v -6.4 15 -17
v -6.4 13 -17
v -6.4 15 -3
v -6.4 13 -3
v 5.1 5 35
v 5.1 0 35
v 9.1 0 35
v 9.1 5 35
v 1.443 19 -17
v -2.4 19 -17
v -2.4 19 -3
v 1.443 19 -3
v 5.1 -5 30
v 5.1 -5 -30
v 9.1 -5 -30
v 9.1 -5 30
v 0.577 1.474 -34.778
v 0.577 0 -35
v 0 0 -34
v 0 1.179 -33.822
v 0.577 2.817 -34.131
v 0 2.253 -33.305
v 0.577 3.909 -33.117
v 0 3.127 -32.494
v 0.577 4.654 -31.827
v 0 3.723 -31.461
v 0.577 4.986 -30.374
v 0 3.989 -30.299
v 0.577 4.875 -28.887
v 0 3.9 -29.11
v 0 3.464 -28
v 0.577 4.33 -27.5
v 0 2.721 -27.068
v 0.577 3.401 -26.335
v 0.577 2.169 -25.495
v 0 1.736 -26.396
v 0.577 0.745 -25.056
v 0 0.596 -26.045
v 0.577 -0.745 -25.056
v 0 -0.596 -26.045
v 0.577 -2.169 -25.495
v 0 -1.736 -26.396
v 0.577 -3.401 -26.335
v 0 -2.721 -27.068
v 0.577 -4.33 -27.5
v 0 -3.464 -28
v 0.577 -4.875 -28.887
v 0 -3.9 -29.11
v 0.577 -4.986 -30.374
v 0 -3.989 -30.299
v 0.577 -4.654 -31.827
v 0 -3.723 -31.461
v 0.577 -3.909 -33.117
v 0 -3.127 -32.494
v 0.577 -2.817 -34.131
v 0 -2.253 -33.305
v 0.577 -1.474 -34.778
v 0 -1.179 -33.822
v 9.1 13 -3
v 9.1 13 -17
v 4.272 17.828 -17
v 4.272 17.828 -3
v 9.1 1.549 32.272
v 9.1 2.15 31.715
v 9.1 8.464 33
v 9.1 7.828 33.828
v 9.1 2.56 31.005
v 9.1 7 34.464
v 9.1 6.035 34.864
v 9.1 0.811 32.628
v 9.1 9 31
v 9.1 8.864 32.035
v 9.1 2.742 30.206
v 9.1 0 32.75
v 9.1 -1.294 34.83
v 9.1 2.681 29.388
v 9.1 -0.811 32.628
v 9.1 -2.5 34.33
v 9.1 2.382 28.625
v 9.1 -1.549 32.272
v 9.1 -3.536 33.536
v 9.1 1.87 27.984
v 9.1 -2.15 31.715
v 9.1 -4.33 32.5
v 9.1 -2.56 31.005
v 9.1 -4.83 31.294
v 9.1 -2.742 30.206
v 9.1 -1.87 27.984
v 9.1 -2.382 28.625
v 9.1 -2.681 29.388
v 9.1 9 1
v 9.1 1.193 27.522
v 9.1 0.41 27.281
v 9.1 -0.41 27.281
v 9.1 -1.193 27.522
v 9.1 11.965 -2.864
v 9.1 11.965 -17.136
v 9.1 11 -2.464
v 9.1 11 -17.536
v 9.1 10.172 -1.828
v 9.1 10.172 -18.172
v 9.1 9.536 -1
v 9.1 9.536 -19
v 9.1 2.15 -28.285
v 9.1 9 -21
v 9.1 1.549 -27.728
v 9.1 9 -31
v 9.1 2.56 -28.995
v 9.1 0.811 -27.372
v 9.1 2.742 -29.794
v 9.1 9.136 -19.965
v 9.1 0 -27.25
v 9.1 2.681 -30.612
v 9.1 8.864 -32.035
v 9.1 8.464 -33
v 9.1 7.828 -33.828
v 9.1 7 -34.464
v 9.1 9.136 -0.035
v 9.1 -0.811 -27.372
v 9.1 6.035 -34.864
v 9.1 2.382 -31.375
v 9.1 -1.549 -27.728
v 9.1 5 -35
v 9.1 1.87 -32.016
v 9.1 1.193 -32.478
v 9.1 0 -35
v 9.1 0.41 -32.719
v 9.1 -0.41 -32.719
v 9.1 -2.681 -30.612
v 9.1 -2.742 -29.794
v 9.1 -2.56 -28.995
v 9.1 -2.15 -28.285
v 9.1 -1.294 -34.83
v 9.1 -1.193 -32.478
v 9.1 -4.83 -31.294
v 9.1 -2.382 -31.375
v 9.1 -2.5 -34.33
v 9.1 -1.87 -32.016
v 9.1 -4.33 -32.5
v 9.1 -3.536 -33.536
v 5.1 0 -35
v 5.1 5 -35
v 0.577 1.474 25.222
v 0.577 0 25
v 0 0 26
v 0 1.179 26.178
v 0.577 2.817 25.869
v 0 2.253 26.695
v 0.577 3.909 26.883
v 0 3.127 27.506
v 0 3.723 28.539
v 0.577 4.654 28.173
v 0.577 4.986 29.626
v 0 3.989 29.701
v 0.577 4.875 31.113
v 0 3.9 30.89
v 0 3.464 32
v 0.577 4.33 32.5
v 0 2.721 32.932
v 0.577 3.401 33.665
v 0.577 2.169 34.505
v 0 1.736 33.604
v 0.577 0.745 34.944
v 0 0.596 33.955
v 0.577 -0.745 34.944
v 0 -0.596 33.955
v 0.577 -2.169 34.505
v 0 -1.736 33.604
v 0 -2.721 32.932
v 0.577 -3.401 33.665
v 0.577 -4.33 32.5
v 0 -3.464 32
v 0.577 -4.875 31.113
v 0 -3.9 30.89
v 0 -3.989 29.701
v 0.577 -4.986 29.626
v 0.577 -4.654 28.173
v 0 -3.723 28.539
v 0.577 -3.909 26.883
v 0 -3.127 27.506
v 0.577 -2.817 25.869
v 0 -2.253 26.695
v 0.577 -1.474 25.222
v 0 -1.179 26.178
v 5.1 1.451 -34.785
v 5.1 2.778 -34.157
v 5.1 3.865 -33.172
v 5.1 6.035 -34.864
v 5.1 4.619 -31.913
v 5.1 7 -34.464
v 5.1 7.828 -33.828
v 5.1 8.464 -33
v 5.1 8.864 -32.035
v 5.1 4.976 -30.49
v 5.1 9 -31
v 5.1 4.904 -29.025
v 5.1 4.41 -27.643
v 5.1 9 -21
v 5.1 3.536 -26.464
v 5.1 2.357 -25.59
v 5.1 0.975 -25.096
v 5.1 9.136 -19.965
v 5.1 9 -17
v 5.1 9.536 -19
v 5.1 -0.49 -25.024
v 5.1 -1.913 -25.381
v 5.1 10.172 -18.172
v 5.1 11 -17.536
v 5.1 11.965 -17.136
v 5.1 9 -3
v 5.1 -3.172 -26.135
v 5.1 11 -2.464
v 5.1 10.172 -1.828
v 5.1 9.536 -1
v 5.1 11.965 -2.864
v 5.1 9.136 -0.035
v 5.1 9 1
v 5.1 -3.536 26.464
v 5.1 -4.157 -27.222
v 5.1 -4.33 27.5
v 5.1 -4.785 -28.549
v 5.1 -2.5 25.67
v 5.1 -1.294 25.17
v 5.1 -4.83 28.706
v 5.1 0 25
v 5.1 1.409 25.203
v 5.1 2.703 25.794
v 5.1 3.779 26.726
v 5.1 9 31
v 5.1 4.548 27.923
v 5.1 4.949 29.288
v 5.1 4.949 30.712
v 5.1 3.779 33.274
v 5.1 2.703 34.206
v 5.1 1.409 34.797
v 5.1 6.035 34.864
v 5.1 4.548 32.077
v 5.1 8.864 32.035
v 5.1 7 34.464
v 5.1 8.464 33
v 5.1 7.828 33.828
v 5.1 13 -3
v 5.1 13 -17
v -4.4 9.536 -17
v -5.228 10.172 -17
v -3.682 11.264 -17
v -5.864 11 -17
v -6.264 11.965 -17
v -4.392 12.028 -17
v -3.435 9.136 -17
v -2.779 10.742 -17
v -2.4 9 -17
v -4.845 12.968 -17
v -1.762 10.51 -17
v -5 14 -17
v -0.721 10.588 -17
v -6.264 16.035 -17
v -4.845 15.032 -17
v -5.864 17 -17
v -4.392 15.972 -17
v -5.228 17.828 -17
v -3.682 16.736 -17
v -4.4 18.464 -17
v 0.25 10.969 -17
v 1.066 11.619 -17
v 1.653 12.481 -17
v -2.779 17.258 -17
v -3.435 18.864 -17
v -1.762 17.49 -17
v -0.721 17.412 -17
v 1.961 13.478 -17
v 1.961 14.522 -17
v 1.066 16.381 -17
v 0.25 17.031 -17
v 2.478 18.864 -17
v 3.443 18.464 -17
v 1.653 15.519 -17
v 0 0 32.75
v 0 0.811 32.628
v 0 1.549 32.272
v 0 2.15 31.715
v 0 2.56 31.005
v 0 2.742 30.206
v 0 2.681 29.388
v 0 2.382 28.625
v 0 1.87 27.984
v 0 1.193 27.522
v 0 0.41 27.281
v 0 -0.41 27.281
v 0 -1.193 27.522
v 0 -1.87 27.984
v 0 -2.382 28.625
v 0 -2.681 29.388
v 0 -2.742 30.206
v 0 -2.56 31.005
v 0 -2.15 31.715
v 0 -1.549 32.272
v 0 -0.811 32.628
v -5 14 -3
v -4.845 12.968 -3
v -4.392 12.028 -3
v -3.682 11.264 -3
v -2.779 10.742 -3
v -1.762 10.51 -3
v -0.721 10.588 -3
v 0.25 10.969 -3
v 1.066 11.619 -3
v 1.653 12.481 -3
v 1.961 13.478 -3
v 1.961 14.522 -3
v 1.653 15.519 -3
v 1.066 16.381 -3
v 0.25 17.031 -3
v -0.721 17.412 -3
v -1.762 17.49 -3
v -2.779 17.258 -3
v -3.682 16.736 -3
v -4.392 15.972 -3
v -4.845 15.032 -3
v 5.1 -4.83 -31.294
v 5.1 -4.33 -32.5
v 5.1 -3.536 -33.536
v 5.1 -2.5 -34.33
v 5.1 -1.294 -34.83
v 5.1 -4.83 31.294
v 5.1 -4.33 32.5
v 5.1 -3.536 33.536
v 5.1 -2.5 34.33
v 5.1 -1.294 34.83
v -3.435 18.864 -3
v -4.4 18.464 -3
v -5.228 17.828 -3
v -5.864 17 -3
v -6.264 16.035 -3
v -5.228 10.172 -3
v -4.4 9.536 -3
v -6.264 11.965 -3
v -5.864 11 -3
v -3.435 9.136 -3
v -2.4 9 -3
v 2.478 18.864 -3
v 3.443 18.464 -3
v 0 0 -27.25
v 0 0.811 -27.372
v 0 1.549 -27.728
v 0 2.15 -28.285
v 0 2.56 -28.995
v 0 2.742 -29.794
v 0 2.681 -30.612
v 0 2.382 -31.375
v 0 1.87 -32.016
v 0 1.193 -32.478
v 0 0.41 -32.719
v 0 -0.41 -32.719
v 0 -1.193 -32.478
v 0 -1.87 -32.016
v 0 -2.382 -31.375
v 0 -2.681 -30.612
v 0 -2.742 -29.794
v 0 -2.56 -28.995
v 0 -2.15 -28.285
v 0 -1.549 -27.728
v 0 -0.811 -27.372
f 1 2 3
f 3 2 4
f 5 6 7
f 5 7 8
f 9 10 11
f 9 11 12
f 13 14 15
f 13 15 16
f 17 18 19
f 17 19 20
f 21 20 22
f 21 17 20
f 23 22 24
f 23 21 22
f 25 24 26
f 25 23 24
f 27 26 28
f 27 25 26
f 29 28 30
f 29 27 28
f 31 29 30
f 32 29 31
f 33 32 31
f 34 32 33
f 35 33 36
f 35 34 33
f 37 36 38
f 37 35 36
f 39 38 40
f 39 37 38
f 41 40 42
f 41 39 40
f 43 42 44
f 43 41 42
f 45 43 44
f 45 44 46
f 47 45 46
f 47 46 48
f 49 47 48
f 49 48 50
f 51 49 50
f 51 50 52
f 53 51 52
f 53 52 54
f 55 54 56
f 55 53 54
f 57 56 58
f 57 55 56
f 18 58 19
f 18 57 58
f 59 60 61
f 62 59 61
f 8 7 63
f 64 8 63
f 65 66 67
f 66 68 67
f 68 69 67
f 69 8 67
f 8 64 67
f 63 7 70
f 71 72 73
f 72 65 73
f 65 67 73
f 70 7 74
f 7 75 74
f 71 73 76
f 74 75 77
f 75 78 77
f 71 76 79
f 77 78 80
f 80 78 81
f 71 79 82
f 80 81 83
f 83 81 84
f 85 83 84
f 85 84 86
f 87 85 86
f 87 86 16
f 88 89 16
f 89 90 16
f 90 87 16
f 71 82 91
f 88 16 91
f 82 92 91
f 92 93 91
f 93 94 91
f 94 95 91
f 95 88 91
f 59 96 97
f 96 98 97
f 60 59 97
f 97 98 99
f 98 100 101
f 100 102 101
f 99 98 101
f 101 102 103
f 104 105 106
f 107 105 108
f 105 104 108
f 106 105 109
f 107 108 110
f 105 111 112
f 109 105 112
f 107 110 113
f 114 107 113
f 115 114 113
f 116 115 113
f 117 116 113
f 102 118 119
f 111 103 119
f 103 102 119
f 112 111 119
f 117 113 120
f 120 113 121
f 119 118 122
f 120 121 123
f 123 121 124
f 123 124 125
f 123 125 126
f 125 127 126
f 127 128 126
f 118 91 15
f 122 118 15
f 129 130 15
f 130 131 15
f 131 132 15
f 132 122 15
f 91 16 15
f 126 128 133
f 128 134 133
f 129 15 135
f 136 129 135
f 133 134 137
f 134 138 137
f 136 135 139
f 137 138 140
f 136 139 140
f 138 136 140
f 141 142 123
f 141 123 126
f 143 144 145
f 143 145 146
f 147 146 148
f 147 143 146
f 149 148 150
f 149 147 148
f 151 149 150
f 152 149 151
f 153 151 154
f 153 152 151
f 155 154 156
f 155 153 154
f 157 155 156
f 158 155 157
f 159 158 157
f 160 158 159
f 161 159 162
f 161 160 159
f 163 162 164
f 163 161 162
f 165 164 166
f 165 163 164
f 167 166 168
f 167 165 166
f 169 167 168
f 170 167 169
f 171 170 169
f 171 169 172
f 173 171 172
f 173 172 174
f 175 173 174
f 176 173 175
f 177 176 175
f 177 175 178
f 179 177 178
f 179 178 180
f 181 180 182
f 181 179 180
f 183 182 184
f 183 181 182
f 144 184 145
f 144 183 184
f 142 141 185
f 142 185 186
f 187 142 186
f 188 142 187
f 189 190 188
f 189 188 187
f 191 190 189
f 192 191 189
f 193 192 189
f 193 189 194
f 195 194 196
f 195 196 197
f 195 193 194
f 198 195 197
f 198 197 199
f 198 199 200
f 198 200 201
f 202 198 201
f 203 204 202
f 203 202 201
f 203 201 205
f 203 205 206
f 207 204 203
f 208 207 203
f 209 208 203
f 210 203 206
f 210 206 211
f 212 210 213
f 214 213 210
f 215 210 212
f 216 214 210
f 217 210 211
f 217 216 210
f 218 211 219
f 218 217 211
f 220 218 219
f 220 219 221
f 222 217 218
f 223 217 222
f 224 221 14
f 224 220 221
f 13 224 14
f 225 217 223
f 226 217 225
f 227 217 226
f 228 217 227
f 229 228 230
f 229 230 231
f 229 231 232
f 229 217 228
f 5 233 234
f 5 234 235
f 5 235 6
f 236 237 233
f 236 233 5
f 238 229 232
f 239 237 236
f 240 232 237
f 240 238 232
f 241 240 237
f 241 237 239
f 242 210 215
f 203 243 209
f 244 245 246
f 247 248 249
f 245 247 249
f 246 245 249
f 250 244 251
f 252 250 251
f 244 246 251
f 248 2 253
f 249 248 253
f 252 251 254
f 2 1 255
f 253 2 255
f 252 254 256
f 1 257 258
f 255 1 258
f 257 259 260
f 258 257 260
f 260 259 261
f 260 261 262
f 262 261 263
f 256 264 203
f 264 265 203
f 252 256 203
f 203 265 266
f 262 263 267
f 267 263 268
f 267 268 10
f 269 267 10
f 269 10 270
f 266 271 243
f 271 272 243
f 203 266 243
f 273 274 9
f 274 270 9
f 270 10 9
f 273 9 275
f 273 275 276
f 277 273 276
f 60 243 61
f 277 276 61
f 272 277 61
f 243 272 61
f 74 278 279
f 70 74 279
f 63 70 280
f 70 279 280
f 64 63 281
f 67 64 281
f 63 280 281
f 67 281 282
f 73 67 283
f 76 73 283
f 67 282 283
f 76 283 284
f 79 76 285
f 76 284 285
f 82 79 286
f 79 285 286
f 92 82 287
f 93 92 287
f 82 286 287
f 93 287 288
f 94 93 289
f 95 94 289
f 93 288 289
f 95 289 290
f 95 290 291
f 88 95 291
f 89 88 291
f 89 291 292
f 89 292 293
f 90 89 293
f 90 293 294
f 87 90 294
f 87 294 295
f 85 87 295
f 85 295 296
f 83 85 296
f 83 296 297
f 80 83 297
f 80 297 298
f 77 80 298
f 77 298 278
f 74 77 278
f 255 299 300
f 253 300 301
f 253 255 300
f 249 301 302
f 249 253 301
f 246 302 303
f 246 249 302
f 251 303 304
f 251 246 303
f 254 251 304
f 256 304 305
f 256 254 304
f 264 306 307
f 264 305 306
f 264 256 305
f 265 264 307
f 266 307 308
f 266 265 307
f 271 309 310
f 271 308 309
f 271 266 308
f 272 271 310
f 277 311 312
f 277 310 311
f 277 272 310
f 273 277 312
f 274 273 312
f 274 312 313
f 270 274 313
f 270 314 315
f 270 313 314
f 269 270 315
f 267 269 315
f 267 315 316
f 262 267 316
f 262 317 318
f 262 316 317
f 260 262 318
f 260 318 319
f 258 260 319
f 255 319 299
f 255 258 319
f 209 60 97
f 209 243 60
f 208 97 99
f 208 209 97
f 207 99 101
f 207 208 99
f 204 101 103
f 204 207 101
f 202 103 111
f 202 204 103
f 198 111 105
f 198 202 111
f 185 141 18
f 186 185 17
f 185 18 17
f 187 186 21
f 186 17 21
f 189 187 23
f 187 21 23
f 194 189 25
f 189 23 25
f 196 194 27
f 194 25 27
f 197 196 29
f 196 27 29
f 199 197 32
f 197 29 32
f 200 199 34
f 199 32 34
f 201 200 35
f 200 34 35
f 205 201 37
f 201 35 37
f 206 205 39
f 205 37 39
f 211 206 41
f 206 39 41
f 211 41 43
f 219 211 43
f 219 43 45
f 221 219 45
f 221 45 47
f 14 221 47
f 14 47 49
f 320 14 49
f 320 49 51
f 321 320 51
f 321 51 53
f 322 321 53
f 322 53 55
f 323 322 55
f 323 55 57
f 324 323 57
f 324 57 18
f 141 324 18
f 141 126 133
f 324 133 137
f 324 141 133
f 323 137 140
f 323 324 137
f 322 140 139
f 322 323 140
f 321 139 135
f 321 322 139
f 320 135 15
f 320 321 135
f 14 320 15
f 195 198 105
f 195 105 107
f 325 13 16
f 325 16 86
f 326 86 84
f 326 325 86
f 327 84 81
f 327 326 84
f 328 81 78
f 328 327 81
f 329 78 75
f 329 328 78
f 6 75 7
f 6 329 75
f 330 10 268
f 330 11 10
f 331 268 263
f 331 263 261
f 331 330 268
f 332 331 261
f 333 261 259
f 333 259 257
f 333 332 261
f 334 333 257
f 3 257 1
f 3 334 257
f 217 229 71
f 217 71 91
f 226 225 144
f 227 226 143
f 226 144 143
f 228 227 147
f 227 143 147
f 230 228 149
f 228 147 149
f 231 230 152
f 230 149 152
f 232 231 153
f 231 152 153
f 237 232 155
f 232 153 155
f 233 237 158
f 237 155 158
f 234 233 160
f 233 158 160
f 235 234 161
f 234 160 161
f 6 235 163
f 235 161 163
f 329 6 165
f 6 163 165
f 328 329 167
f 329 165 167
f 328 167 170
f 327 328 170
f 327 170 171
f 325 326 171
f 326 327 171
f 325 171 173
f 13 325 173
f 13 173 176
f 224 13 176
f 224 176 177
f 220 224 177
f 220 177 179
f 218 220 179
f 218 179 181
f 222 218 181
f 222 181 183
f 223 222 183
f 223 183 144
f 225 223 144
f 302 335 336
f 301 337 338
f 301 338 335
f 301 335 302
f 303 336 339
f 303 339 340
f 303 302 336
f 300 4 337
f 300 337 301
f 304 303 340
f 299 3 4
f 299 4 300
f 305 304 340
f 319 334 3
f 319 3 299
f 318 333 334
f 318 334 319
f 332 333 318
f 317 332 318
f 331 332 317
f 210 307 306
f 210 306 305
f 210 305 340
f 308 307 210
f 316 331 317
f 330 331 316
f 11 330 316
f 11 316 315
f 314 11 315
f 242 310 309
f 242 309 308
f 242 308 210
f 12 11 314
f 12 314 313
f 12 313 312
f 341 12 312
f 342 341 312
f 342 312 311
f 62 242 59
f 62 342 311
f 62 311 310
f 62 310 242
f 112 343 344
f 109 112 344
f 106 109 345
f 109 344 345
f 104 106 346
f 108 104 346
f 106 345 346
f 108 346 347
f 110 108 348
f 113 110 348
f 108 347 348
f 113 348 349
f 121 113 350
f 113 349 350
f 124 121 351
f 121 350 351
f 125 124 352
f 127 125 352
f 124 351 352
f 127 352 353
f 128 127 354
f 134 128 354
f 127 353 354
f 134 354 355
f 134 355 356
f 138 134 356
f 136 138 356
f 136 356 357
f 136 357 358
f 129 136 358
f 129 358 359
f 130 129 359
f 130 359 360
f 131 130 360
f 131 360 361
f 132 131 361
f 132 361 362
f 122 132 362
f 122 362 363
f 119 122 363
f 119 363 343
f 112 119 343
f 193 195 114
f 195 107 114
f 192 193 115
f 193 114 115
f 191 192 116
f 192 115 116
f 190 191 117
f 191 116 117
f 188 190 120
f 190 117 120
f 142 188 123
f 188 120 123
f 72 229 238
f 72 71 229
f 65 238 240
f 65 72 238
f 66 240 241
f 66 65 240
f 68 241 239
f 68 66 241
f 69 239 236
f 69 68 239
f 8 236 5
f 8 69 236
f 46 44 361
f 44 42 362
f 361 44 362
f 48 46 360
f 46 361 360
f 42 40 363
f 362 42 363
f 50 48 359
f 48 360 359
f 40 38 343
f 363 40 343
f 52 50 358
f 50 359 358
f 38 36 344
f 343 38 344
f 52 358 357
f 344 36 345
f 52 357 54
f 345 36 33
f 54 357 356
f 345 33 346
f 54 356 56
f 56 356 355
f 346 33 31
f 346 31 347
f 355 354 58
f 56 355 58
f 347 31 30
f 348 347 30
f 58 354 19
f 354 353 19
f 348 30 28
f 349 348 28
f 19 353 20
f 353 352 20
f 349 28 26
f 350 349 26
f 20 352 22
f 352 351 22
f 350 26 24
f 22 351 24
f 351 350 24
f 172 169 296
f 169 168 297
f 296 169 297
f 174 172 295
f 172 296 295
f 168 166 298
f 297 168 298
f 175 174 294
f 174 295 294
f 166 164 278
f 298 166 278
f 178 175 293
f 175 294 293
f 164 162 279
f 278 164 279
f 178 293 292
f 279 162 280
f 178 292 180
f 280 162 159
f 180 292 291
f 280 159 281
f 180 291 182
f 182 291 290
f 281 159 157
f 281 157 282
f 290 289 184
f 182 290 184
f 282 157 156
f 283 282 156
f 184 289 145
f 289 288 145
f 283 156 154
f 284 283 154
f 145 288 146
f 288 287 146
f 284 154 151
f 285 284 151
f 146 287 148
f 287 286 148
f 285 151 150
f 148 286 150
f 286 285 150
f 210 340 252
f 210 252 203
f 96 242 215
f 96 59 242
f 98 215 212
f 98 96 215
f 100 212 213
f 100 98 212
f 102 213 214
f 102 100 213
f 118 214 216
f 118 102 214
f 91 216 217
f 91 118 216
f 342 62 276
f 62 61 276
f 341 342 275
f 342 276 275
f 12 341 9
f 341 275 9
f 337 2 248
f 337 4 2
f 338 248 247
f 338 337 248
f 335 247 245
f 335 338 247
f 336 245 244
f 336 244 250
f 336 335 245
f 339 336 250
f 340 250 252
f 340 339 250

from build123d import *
from OCP.BRepFilletAPI import BRepFilletAPI_MakeChamfer

# Parameters (mm, degrees)
SKETCH1_R             = 5
BOSS_EXTRUDE1_DEPTH   = 5.1
BOSS_EXTRUDE1_2_DEPTH = 5.1
BOSS_EXTRUDE2_DEPTH   = 4
BOSS_EXTRUDE3_DEPTH   = 4
BOSS_EXTRUDE4_DEPTH   = 6
SKETCH5_R             = 3.5
CUT_EXTRUDE1_DEPTH    = 57.105347339
SKETCH7_R             = 2.75
CUT_EXTRUDE2_DEPTH    = 41.851070977
BOSS_EXTRUDE5_DEPTH   = 14
FILLET1_R             = 4
FILLET2_R             = 4
FILLET3_R             = 4
CHAMFER1_SIZE         = 1
CHAMFER1_SIZE2        = 0.577350269


with BuildPart() as part:
    # Sketch1 → Boss-Extrude1 (new body)
    with BuildSketch(Plane(origin=(0, 0, 0), x_dir=(0, 0, -1), z_dir=(1, 0, 0))):
        with Locations((30, 0)):
            Circle(SKETCH1_R)
    extrude(amount=BOSS_EXTRUDE1_DEPTH)



with BuildPart() as body_2:
    # Sketch1 → Boss-Extrude1 2 (new body)
    with BuildSketch(Plane(origin=(0, 0, 0), x_dir=(0, 0, -1), z_dir=(1, 0, 0))):
        with Locations((-30, 0)):
            Circle(SKETCH1_R)
    extrude(amount=BOSS_EXTRUDE1_2_DEPTH)


with BuildPart() as part_1:
    add(part.part)

    add(body_2.part)  # Boss-Extrude2 merges body 2
    # Sketch2 → Boss-Extrude2 (add)
    with BuildSketch(Plane(origin=(5.1, 0, 0), x_dir=(0, 0, -1), z_dir=(1, 0, 0))):
        with BuildLine():
            Line((30, -5), (-30, -5))
            ThreePointArc((-30, -5), (-33.535533906, -3.535533906), (-35, 0))
            Line((-35, 0), (-35, 5))
            Line((-35, 5), (-35, 9))
            Line((-35, 9), (35, 9))
            Line((35, 9), (35, 0))
            ThreePointArc((35, 0), (33.535533906, -3.535533906), (30, -5))
        make_face()
    extrude(amount=BOSS_EXTRUDE2_DEPTH)

    # Sketch3 → Boss-Extrude3 (add)
    with BuildSketch(Plane(origin=(0, 9, 0), x_dir=(1, 0, 0), z_dir=(0, 1, 0))):
        Polygon((5.1, 17), (-4.9, 17), (-6.4, 17), (-6.4, 3), (-4.9, 3), (9.1, 3), (9.1, 17), align=None)
    extrude(amount=BOSS_EXTRUDE3_DEPTH)

    # Sketch4 → Boss-Extrude4 (add)
    with BuildSketch(Plane(origin=(0, 13, 0), x_dir=(1, 0, 0), z_dir=(0, 1, 0))):
        Polygon((3.1, 17), (-6.4, 17), (-6.4, 3), (3.1, 3), (3.1, 10), align=None)
    extrude(amount=BOSS_EXTRUDE4_DEPTH)

    # Sketch5 → Cut-Extrude1 (cut, through all)
    with BuildSketch(Plane.XY.offset(-17)):
        with Locations(Location((-1.5, 14, 0), (0, 0, 180))):
            Circle(SKETCH5_R)
    extrude(amount=CUT_EXTRUDE1_DEPTH, mode=Mode.SUBTRACT)

    # Sketch7 → Cut-Extrude2 (cut, through all)
    with BuildSketch(Plane.ZY):
        with Locations((-30, 0)):
            Circle(SKETCH7_R)
        with Locations((30, 0)):
            Circle(SKETCH7_R)
    extrude(amount=-CUT_EXTRUDE2_DEPTH, mode=Mode.SUBTRACT)

    # Sketch8 → Boss-Extrude5 (add)
    with BuildSketch(Plane(origin=(0, 0, -17), x_dir=(-1, 0, 0), z_dir=(0, 0, -1))):
        Polygon((-9.1, 13), (-3.1, 19), (-3.1, 13), align=None)
    extrude(amount=-BOSS_EXTRUDE5_DEPTH)

    # Fillet1
    fillet1_edges = [part_1.edges().sort_by_distance(p)[0] for p in [
        (-6.4, 9, -10),
        (-6.4, 19, -10),
        (3.1, 19, -10),
    ]]
    fillet(fillet1_edges, radius=FILLET1_R - 0.0001)  # a hair under: the kernel refuses the full size

    # Fillet2
    fillet2_edges = [part_1.edges().sort_by_distance(p)[0] for p in [
        (7.1, 9, -3),
        (7.1, 9, -17),
    ]]
    fillet(fillet2_edges, radius=FILLET2_R)

    # Fillet3
    fillet3_edges = [part_1.edges().sort_by_distance(p)[0] for p in [
        (7.1, 9, -35),
        (7.1, 9, 35),
    ]]
    fillet(fillet3_edges, radius=FILLET3_R)

    # Chamfer1: one chamfer whose edges measure the first distance from different faces: ONE call of the kernel's chamfer builder (chamfer() names one face for all edges)
    chamfer1_edges_1 = [part_1.edges().sort_by_distance(p)[0] for p in [
        (0, 0, -25),
    ]]
    chamfer1_side_1 = [part_1.faces().sort_by_distance(p)[0] for p in [
        (0, 0, -25.141421356),
    ]]
    chamfer1_edges_2 = [part_1.edges().sort_by_distance(p)[0] for p in [
        (0, 0, 35),
    ]]
    chamfer1_side_2 = [part_1.faces().sort_by_distance(p)[0] for p in [
        (0, 0, 34.858578644),
    ]]
    chamfer1 = BRepFilletAPI_MakeChamfer(part_1.part.solid().wrapped)
    for e in chamfer1_edges_1:
        chamfer1.Add(CHAMFER1_SIZE, CHAMFER1_SIZE2, e.wrapped, chamfer1_side_1[0].wrapped)  # the first distance lies on this face
    for e in chamfer1_edges_2:
        chamfer1.Add(CHAMFER1_SIZE, CHAMFER1_SIZE2, e.wrapped, chamfer1_side_2[0].wrapped)  # the first distance lies on this face
    add(Compound.cast(chamfer1.Shape()), mode=Mode.REPLACE)


solid = part_1.part
